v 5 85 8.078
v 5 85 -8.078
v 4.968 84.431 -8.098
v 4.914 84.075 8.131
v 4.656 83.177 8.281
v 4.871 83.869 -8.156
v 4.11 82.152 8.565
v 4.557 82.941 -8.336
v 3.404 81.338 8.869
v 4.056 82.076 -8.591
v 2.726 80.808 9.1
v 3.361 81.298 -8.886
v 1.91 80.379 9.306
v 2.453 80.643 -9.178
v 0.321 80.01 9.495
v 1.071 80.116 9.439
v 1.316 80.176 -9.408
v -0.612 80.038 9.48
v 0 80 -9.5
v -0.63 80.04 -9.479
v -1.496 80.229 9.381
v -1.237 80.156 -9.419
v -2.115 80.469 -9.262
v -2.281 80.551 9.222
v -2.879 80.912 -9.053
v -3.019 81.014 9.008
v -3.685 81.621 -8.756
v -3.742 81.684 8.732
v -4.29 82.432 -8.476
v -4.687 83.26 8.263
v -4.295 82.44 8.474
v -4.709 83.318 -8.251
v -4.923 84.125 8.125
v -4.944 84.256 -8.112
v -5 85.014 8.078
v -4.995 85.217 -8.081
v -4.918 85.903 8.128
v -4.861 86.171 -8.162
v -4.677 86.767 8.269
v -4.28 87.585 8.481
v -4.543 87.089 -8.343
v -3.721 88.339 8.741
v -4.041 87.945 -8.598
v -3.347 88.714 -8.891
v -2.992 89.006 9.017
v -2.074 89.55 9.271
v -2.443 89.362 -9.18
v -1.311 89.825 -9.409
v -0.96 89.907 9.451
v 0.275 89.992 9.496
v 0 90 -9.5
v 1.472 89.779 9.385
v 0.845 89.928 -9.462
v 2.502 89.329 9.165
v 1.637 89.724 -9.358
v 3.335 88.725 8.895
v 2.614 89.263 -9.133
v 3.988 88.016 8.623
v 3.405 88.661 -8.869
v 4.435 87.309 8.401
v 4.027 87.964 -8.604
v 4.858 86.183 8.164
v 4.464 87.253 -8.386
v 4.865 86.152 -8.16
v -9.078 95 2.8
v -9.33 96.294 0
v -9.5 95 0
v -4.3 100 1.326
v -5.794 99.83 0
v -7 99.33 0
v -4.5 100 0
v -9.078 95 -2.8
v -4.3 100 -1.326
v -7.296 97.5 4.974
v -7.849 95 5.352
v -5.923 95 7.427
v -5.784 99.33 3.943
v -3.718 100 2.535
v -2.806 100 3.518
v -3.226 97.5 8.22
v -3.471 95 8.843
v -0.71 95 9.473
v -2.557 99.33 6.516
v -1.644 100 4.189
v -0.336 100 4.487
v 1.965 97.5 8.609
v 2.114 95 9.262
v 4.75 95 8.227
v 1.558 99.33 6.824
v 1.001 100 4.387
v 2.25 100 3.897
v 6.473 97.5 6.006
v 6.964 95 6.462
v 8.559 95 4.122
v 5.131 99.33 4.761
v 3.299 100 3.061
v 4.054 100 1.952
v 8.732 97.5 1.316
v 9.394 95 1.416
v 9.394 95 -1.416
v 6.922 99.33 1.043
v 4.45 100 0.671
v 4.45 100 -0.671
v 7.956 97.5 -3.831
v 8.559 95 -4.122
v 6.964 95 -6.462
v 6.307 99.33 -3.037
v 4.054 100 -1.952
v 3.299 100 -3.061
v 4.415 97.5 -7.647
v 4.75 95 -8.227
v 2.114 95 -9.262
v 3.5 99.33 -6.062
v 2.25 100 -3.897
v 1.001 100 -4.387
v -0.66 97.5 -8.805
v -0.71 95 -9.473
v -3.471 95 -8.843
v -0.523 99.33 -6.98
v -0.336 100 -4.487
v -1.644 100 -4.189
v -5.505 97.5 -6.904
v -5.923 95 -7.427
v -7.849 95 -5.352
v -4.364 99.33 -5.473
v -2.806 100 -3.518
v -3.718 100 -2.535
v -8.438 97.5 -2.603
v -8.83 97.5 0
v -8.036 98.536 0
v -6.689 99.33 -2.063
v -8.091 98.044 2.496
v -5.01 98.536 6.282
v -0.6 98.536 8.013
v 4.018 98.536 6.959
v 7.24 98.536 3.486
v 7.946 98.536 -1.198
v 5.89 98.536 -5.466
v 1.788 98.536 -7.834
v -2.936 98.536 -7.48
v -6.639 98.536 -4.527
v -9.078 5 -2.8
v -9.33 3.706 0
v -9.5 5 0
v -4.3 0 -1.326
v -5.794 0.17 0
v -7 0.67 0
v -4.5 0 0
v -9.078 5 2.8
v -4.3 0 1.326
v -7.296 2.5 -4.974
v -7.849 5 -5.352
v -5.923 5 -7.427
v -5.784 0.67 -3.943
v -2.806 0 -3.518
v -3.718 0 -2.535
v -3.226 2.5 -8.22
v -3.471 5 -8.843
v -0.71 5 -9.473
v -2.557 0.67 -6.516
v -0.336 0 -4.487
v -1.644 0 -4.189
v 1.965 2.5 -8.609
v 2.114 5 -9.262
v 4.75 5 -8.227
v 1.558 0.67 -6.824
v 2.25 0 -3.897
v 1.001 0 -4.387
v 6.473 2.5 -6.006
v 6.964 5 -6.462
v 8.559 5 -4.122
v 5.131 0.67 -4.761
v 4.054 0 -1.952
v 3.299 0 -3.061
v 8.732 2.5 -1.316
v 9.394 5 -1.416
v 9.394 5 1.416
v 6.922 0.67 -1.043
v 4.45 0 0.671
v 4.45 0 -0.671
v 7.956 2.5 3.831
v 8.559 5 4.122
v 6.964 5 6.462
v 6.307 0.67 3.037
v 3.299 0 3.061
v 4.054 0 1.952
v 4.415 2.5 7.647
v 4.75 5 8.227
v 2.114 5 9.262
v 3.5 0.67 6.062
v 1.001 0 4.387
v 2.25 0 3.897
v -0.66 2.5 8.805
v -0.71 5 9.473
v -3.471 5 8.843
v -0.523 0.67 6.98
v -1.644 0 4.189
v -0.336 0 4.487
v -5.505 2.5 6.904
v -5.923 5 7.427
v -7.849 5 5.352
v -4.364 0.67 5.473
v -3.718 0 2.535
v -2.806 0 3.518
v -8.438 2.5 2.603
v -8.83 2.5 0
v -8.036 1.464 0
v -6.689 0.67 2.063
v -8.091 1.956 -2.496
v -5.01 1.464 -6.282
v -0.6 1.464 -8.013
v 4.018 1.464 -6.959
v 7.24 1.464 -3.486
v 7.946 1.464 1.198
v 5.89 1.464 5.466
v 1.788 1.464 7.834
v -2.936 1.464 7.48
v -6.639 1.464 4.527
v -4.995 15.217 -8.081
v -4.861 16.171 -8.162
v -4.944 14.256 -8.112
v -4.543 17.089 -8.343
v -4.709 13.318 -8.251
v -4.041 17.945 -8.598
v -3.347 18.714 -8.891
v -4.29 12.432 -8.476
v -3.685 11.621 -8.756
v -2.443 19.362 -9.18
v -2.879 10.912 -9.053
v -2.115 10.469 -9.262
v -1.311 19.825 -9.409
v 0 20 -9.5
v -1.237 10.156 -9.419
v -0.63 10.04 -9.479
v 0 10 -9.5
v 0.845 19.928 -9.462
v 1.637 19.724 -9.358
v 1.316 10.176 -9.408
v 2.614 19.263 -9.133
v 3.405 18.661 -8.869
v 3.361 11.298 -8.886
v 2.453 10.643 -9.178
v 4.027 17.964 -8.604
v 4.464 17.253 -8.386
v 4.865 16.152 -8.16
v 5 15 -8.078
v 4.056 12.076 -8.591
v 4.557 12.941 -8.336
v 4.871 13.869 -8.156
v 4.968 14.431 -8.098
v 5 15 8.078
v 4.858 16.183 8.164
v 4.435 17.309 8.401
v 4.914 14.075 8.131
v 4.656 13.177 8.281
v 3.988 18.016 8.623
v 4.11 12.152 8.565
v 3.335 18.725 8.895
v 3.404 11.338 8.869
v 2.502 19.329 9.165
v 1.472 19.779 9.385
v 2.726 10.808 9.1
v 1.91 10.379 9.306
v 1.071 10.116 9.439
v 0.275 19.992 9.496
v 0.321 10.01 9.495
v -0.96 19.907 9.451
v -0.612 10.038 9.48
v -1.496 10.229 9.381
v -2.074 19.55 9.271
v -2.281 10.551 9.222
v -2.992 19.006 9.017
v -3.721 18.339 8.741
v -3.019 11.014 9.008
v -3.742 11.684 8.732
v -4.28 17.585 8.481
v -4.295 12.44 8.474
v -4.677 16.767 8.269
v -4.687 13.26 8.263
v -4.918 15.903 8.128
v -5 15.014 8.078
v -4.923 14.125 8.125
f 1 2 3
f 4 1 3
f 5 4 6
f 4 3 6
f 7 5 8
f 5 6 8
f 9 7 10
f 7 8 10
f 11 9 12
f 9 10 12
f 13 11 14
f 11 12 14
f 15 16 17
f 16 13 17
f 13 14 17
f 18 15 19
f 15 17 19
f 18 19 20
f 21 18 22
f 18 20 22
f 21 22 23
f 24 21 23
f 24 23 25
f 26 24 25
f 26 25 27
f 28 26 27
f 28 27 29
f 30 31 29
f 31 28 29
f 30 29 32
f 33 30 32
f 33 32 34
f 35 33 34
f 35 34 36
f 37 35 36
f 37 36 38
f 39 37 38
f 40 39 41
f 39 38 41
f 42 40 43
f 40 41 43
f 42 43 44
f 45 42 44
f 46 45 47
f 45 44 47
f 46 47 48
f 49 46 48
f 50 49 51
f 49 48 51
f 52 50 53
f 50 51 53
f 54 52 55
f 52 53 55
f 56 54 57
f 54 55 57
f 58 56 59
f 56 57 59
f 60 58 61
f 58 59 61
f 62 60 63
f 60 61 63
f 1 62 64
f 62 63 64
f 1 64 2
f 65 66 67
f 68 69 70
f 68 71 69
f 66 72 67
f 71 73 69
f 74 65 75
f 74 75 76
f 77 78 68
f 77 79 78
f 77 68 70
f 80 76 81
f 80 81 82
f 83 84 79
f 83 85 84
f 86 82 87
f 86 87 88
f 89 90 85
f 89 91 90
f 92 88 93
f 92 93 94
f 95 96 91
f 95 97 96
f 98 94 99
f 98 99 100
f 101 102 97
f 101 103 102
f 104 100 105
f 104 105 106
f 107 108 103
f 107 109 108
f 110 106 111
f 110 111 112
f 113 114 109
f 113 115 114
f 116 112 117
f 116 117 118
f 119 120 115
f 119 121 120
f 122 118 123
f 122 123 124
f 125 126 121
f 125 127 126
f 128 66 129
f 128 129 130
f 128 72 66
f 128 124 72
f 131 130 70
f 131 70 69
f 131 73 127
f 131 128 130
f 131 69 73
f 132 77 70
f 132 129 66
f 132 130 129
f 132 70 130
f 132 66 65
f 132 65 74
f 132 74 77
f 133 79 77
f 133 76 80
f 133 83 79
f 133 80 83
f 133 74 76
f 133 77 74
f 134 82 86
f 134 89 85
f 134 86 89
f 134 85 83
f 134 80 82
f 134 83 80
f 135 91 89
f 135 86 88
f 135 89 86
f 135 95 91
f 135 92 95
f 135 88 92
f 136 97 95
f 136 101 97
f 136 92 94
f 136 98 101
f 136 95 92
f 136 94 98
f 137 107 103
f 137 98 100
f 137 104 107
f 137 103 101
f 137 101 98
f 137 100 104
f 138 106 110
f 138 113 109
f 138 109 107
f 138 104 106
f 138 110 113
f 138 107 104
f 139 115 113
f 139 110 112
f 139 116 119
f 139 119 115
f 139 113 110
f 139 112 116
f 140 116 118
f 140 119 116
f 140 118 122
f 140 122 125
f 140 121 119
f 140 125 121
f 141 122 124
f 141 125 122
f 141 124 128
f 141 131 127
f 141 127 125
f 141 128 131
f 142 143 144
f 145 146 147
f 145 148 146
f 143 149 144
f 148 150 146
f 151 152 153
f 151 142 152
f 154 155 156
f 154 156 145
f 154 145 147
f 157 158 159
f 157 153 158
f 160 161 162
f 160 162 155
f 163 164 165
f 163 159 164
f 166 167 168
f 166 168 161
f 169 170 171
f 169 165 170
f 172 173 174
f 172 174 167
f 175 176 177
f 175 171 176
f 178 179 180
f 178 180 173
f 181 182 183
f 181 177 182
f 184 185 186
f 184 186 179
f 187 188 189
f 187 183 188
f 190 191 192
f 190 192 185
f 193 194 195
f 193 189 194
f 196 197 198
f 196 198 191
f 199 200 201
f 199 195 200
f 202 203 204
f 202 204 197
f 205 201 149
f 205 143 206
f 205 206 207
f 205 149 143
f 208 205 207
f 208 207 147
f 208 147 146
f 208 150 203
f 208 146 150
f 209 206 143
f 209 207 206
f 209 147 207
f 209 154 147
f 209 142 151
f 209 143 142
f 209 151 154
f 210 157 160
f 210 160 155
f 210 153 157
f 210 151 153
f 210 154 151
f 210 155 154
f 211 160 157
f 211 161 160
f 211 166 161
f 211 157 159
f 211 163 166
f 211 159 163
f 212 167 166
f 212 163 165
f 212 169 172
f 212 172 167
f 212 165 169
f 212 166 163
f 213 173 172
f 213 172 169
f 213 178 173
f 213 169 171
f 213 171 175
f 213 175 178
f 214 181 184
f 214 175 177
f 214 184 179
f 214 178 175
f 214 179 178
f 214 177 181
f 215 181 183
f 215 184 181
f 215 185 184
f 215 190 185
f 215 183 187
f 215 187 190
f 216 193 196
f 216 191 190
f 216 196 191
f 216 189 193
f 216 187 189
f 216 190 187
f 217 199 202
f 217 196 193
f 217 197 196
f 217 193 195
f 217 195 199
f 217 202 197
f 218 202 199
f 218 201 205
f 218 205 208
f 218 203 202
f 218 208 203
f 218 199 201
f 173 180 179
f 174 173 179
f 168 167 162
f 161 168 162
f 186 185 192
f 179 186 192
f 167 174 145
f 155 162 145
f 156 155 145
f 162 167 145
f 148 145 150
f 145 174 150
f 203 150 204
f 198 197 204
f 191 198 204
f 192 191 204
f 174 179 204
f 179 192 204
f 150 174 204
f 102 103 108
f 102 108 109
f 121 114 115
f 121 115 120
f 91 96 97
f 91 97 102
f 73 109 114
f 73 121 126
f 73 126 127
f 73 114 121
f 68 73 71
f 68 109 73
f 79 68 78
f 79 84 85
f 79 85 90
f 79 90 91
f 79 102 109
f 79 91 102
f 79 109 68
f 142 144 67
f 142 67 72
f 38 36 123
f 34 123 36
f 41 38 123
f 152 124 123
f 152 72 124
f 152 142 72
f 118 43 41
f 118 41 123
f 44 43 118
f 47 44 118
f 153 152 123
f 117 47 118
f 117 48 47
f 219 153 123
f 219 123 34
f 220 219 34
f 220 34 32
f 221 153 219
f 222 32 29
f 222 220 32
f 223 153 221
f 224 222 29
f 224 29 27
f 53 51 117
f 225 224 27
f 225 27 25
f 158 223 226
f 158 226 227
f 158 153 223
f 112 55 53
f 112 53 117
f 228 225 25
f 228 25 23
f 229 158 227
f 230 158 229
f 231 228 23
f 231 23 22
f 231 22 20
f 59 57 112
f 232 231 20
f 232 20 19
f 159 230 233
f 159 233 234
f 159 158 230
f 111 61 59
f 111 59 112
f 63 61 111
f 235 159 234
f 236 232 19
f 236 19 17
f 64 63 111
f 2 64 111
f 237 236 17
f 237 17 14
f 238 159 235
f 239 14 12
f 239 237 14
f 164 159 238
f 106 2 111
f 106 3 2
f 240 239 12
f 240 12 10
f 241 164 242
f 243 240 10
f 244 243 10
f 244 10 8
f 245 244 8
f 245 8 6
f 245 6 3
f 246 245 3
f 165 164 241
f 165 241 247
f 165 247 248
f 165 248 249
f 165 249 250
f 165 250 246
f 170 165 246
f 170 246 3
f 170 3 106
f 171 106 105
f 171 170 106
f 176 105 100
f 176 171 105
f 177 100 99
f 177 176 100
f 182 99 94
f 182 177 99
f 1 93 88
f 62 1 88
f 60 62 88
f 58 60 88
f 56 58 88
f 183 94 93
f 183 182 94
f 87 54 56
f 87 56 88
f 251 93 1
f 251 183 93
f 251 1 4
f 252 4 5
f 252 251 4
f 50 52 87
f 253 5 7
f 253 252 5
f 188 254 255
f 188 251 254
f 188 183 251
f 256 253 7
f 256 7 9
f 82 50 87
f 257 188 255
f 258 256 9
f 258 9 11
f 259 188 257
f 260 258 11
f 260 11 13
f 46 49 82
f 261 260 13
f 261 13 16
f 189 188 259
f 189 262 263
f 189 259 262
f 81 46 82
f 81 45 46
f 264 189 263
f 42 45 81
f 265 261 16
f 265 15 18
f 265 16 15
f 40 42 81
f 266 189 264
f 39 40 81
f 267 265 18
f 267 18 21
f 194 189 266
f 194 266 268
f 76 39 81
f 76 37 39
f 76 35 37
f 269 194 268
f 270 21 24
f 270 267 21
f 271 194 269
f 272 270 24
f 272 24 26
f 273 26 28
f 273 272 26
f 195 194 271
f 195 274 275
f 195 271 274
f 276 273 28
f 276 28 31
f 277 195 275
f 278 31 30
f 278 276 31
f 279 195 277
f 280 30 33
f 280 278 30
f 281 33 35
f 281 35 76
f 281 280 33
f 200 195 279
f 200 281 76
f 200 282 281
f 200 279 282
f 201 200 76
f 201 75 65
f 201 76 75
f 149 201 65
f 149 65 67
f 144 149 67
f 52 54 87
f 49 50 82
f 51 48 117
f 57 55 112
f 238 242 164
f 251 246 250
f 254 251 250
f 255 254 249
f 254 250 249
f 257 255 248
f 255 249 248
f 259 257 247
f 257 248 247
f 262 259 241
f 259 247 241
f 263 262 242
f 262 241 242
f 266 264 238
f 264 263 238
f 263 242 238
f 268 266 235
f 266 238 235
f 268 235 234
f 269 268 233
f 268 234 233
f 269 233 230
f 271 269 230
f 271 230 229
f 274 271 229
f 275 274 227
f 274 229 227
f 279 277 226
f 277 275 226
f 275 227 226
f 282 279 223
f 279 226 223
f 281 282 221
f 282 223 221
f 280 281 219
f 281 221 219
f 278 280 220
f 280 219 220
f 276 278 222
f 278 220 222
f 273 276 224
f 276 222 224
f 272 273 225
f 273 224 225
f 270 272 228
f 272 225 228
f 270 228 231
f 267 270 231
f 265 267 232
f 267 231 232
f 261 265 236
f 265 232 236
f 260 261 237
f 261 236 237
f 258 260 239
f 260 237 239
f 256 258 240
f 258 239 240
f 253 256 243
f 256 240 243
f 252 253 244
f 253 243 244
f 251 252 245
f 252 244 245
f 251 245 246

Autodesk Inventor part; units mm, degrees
ref_plane "YZ Plane" through (0, 0, 0) normal (1, 0, 0) x (0, 1, 0)
ref_plane "XZ Plane" through (0, 0, 0) normal (0, 1, 0) x (-1, 0, 0)
sketch "Sketch1" plane through (0, 0, 0) normal (0, 1, 0) x (-1, 0, 0)
  circle A0 centre (0, 0) radius 9.5
  dimension "d0" = 19
extrude "Extrusion1" add sketch "Sketch1" along normal blind 100
ref_plane "Work Plane1" through (0, 0, -9.5) normal (0, 0, 1) x (1, 0, 0)
sketch "Sketch2" plane through (0, 0, -9.5) normal (0, 0, 1) x (1, 0, 0)
  line L0 (0, 0) -> (0, 100)
  line L1 (9.5, 100) -> (-9.5, 100) projected
  line L2 (0, 50) -> (0, 15)
  line L3 (0, 50) -> (0, 85)
  circle A0 centre (0, 15) radius 5
  circle A1 centre (0, 85) radius 5
  dimension "d4" = 35
  dimension "d5" = 35
  dimension "d6" = 10
  dimension "d7" = 10
extrude "Extrusion2" cut sketch "Sketch2" along normal blind 20
fillet "Fillet1" radius 5 2 edges at (9.5, 100, 0) (9.5, 0, 0)
equation "\"BendRadius\" = Thickness"
equation "\"BendReliefWidth\" = Thickness"
equation "\"BendReliefDepth\" = 0.5 * Thickness"
equation "\"CornerReliefSize\" = 4 * Thickness"
equation "\"MinimumRemnant\" = 2 * Thickness"
equation "\"TransitionRadius\" = BendRadius"
equation "\"JacobiRadiusSize\" = BendRadius"
equation "\"GapSize\" = Thickness"
equation "\"Thickness\" = 0.5"
